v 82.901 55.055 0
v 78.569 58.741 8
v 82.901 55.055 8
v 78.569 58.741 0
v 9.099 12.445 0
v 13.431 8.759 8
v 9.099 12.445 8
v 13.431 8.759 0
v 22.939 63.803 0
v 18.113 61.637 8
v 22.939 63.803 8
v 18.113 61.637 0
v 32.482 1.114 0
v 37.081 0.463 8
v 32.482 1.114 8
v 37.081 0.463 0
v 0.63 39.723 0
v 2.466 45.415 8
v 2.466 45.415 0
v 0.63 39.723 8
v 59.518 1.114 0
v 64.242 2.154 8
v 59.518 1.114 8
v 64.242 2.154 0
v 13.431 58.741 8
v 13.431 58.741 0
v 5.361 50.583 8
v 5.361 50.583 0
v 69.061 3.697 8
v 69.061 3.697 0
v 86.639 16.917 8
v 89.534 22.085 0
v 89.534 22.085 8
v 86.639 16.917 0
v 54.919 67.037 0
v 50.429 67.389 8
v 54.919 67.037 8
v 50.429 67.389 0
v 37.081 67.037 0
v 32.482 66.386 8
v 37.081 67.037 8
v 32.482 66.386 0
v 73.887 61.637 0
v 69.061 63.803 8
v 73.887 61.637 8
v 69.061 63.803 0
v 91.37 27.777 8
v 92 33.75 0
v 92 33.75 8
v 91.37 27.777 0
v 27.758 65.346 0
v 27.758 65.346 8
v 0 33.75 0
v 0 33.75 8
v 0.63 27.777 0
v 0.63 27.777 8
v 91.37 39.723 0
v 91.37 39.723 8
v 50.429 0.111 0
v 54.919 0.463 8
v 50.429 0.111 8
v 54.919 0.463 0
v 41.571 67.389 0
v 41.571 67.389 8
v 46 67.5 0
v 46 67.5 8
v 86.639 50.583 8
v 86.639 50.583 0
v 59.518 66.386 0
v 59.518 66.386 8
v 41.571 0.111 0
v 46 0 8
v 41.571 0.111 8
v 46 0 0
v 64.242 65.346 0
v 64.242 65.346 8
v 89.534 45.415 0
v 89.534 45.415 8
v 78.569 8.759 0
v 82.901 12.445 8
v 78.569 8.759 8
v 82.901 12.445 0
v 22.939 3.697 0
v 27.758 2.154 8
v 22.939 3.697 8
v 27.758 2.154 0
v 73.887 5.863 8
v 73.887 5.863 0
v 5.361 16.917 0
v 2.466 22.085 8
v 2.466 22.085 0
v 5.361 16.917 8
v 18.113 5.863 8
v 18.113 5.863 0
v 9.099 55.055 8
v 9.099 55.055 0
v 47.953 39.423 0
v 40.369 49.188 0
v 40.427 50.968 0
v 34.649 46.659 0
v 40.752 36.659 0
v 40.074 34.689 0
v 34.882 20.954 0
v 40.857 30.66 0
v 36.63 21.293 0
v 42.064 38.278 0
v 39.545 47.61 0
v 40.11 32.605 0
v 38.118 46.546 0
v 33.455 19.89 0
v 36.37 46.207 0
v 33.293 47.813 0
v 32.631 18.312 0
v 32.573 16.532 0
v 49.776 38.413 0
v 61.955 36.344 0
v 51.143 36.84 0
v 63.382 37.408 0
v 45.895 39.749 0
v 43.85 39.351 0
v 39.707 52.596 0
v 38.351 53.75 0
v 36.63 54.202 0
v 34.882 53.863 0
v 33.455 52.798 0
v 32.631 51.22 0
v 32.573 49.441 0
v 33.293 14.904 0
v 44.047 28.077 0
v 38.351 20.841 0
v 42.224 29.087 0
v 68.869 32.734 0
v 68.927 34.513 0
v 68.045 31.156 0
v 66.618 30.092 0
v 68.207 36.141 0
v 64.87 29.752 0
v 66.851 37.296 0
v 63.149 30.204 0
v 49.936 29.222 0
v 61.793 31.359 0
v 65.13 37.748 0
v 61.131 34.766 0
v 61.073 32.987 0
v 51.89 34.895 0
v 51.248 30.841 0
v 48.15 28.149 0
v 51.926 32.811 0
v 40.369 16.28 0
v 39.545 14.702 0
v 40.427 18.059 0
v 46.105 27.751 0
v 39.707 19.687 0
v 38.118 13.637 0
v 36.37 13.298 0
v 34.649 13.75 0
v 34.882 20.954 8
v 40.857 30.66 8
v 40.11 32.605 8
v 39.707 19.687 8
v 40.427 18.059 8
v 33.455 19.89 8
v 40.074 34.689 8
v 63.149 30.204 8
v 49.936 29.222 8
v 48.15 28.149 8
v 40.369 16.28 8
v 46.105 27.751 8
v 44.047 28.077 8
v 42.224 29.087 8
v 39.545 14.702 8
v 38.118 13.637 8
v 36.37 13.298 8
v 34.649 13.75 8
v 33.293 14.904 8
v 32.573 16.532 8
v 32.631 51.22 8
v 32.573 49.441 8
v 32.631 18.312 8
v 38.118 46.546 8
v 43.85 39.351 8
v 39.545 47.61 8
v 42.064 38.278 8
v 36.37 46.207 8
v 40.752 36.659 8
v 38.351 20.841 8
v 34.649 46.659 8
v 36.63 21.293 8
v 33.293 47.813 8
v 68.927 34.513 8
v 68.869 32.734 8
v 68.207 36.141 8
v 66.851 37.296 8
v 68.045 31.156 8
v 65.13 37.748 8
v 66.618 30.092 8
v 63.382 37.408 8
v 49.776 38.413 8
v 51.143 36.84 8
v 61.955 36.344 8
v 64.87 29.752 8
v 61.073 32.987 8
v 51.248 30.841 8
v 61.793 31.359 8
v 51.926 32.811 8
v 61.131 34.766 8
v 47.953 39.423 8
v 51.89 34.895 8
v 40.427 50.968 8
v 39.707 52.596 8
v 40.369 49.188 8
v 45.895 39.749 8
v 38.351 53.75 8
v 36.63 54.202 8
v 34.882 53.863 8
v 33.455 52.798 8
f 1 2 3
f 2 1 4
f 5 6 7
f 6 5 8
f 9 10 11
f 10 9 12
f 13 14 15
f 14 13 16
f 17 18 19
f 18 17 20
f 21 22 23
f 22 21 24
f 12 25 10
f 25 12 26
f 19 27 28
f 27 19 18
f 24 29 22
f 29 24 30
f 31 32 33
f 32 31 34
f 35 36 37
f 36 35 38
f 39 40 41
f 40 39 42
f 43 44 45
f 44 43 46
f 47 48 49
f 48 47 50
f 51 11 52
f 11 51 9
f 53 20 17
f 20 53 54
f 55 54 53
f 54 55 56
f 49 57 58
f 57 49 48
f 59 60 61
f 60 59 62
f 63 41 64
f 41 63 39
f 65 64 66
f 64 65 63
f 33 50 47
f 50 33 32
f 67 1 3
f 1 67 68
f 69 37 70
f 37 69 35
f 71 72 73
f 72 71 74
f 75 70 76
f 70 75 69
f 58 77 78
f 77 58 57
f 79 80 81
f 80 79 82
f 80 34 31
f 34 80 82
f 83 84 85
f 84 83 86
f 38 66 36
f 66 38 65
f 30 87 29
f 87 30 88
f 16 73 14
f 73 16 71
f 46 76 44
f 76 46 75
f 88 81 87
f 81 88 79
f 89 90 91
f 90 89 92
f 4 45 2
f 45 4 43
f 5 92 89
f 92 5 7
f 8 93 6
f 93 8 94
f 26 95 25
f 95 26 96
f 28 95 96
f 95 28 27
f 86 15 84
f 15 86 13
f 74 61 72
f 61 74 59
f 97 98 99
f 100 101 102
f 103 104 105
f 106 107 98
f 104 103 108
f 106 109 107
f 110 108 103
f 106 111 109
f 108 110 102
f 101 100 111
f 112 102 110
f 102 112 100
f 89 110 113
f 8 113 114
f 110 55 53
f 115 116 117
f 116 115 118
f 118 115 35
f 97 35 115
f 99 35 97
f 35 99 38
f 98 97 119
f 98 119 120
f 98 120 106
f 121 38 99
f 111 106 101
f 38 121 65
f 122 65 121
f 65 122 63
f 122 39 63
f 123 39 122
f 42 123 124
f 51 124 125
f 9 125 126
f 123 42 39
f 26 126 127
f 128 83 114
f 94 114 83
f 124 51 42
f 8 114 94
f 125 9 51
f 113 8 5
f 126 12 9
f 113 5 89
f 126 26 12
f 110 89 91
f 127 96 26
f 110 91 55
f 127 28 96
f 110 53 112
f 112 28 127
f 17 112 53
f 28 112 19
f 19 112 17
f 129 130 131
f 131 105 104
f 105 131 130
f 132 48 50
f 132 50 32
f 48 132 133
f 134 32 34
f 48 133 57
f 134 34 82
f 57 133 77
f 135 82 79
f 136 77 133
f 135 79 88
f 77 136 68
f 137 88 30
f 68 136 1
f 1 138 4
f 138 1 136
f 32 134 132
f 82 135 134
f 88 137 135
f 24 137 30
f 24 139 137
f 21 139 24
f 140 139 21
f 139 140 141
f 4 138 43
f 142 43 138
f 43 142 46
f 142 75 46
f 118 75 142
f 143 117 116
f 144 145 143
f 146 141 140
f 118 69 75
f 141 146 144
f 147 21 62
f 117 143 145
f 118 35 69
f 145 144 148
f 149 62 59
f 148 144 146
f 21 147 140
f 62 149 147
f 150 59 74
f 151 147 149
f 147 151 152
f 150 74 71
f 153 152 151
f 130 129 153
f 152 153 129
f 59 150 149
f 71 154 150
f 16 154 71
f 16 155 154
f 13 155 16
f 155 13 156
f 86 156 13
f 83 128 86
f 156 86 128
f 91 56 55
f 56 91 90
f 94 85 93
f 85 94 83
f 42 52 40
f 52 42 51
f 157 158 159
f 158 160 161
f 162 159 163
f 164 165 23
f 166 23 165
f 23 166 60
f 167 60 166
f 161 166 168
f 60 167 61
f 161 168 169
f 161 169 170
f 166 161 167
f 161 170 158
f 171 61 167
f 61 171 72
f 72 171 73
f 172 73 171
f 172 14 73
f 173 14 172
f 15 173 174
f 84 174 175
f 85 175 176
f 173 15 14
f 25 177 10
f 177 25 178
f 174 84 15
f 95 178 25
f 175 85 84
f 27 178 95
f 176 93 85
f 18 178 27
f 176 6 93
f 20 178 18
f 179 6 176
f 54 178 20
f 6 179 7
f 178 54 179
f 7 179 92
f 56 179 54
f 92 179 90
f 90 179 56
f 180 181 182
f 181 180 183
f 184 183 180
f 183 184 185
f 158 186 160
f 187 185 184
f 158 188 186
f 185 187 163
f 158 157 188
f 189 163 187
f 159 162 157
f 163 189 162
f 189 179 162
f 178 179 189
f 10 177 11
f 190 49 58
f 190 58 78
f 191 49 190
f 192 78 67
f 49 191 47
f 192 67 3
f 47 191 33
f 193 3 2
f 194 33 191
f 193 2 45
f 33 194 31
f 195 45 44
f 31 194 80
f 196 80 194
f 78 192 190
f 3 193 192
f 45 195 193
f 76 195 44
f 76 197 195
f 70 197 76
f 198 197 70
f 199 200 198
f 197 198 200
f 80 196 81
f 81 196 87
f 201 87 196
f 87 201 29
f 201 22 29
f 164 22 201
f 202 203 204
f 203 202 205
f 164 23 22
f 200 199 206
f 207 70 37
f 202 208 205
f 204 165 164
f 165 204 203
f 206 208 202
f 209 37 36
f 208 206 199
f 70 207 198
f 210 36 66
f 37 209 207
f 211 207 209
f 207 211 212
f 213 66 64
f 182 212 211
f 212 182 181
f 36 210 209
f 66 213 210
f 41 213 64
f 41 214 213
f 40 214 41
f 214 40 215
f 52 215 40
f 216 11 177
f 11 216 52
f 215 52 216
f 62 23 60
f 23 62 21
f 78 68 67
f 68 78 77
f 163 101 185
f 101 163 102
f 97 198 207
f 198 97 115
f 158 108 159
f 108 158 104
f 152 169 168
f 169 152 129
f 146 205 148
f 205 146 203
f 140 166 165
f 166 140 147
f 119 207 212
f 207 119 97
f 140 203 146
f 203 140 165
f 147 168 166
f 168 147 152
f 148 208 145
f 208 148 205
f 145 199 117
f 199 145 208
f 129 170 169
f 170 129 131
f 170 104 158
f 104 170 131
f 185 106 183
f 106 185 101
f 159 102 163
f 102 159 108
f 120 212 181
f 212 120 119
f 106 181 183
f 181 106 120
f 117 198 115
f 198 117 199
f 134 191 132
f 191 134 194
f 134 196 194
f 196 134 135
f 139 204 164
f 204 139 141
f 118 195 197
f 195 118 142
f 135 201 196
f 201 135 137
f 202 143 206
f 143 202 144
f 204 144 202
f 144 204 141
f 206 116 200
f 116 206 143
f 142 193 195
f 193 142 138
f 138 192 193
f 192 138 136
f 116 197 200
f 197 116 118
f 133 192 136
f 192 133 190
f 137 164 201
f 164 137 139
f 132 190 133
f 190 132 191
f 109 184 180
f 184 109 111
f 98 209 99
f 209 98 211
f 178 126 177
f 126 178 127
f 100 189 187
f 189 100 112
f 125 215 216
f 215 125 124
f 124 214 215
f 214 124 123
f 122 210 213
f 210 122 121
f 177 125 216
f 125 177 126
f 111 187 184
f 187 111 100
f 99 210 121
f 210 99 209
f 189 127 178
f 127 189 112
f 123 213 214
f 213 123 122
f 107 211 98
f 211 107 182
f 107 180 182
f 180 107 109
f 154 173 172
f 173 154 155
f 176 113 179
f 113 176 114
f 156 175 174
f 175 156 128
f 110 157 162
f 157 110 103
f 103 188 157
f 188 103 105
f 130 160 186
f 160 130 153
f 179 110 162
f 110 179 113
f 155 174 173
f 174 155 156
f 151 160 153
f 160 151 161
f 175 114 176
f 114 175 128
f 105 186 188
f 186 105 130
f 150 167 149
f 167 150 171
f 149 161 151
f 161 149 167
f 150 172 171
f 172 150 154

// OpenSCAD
$fn = 32;

// ----------------------------------------------------------------------
// Cam plate: double_lobe cam, base R32
// ----------------------------------------------------------------------

// --- parameters (mm) ---
base_r = 32;              // base circle radius
lobe_h = 14;              // cam lobe rise
bore_r = 6;               // shaft bore radius
plate_t = 8;              // plate thickness, Z (extrusion height)
ring_r = 19;              // lightening ring radius
bolt_r = 4;               // lightening hole radius
fit_tol = 0.05;           // declared fit tolerance (prompt contract)
free_tol = 0.2;           // declared free tolerance (prompt contract)

profile = [[92, 33.75], [91.37, 39.723], [89.534, 45.415], [86.639, 50.583], [82.901, 55.055], [78.569, 58.741], [73.887, 61.637], [69.061, 63.803], [64.242, 65.346], [59.518, 66.386], [54.919, 67.037], [50.429, 67.389], [46, 67.5], [41.571, 67.389], [37.081, 67.037], [32.482, 66.386], [27.758, 65.346], [22.939, 63.803], [18.113, 61.637], [13.431, 58.741], [9.099, 55.055], [5.361, 50.583], [2.466, 45.415], [0.63, 39.723], [0, 33.75], [0.63, 27.777], [2.466, 22.085], [5.361, 16.917], [9.099, 12.445], [13.431, 8.759], [18.113, 5.863], [22.939, 3.697], [27.758, 2.154], [32.482, 1.114], [37.081, 0.463], [41.571, 0.111], [46, 0], [50.429, 0.111], [54.919, 0.463], [59.518, 1.114], [64.242, 2.154], [69.061, 3.697], [73.887, 5.863], [78.569, 8.759], [82.901, 12.445], [86.639, 16.917], [89.534, 22.085], [91.37, 27.777]];  // primary outline, 48 points, counter clockwise
void_1 = [[51.89, 34.895], [51.143, 36.84], [49.776, 38.413], [47.953, 39.423], [45.895, 39.749], [43.85, 39.351], [42.064, 38.278], [40.752, 36.659], [40.074, 34.689], [40.11, 32.605], [40.857, 30.66], [42.224, 29.087], [44.047, 28.077], [46.105, 27.751], [48.15, 28.149], [49.936, 29.222], [51.248, 30.841], [51.926, 32.811]];  // shaft bore, 18 points
void_2 = [[68.927, 34.513], [68.207, 36.141], [66.851, 37.296], [65.13, 37.748], [63.382, 37.408], [61.955, 36.344], [61.131, 34.766], [61.073, 32.987], [61.793, 31.359], [63.149, 30.204], [64.87, 29.752], [66.618, 30.092], [68.045, 31.156], [68.869, 32.734]];  // lightening hole 1, 14 points
void_3 = [[40.427, 50.968], [39.707, 52.596], [38.351, 53.75], [36.63, 54.202], [34.882, 53.863], [33.455, 52.798], [32.631, 51.22], [32.573, 49.441], [33.293, 47.813], [34.649, 46.659], [36.37, 46.207], [38.118, 46.546], [39.545, 47.61], [40.369, 49.188]];  // lightening hole 2, 14 points
void_4 = [[40.427, 18.059], [39.707, 19.687], [38.351, 20.841], [36.63, 21.293], [34.882, 20.954], [33.455, 19.89], [32.631, 18.312], [32.573, 16.532], [33.293, 14.904], [34.649, 13.75], [36.37, 13.298], [38.118, 13.637], [39.545, 14.702], [40.369, 16.28]];  // lightening hole 3, 14 points

// --- the one profile operation ---
difference() {
  linear_extrude(height = plate_t) polygon(points = profile);
  translate([0, 0, -1])
    linear_extrude(height = plate_t + 2) polygon(points = void_1);
  translate([0, 0, -1])
    linear_extrude(height = plate_t + 2) polygon(points = void_2);
  translate([0, 0, -1])
    linear_extrude(height = plate_t + 2) polygon(points = void_3);
  translate([0, 0, -1])
    linear_extrude(height = plate_t + 2) polygon(points = void_4);
}
